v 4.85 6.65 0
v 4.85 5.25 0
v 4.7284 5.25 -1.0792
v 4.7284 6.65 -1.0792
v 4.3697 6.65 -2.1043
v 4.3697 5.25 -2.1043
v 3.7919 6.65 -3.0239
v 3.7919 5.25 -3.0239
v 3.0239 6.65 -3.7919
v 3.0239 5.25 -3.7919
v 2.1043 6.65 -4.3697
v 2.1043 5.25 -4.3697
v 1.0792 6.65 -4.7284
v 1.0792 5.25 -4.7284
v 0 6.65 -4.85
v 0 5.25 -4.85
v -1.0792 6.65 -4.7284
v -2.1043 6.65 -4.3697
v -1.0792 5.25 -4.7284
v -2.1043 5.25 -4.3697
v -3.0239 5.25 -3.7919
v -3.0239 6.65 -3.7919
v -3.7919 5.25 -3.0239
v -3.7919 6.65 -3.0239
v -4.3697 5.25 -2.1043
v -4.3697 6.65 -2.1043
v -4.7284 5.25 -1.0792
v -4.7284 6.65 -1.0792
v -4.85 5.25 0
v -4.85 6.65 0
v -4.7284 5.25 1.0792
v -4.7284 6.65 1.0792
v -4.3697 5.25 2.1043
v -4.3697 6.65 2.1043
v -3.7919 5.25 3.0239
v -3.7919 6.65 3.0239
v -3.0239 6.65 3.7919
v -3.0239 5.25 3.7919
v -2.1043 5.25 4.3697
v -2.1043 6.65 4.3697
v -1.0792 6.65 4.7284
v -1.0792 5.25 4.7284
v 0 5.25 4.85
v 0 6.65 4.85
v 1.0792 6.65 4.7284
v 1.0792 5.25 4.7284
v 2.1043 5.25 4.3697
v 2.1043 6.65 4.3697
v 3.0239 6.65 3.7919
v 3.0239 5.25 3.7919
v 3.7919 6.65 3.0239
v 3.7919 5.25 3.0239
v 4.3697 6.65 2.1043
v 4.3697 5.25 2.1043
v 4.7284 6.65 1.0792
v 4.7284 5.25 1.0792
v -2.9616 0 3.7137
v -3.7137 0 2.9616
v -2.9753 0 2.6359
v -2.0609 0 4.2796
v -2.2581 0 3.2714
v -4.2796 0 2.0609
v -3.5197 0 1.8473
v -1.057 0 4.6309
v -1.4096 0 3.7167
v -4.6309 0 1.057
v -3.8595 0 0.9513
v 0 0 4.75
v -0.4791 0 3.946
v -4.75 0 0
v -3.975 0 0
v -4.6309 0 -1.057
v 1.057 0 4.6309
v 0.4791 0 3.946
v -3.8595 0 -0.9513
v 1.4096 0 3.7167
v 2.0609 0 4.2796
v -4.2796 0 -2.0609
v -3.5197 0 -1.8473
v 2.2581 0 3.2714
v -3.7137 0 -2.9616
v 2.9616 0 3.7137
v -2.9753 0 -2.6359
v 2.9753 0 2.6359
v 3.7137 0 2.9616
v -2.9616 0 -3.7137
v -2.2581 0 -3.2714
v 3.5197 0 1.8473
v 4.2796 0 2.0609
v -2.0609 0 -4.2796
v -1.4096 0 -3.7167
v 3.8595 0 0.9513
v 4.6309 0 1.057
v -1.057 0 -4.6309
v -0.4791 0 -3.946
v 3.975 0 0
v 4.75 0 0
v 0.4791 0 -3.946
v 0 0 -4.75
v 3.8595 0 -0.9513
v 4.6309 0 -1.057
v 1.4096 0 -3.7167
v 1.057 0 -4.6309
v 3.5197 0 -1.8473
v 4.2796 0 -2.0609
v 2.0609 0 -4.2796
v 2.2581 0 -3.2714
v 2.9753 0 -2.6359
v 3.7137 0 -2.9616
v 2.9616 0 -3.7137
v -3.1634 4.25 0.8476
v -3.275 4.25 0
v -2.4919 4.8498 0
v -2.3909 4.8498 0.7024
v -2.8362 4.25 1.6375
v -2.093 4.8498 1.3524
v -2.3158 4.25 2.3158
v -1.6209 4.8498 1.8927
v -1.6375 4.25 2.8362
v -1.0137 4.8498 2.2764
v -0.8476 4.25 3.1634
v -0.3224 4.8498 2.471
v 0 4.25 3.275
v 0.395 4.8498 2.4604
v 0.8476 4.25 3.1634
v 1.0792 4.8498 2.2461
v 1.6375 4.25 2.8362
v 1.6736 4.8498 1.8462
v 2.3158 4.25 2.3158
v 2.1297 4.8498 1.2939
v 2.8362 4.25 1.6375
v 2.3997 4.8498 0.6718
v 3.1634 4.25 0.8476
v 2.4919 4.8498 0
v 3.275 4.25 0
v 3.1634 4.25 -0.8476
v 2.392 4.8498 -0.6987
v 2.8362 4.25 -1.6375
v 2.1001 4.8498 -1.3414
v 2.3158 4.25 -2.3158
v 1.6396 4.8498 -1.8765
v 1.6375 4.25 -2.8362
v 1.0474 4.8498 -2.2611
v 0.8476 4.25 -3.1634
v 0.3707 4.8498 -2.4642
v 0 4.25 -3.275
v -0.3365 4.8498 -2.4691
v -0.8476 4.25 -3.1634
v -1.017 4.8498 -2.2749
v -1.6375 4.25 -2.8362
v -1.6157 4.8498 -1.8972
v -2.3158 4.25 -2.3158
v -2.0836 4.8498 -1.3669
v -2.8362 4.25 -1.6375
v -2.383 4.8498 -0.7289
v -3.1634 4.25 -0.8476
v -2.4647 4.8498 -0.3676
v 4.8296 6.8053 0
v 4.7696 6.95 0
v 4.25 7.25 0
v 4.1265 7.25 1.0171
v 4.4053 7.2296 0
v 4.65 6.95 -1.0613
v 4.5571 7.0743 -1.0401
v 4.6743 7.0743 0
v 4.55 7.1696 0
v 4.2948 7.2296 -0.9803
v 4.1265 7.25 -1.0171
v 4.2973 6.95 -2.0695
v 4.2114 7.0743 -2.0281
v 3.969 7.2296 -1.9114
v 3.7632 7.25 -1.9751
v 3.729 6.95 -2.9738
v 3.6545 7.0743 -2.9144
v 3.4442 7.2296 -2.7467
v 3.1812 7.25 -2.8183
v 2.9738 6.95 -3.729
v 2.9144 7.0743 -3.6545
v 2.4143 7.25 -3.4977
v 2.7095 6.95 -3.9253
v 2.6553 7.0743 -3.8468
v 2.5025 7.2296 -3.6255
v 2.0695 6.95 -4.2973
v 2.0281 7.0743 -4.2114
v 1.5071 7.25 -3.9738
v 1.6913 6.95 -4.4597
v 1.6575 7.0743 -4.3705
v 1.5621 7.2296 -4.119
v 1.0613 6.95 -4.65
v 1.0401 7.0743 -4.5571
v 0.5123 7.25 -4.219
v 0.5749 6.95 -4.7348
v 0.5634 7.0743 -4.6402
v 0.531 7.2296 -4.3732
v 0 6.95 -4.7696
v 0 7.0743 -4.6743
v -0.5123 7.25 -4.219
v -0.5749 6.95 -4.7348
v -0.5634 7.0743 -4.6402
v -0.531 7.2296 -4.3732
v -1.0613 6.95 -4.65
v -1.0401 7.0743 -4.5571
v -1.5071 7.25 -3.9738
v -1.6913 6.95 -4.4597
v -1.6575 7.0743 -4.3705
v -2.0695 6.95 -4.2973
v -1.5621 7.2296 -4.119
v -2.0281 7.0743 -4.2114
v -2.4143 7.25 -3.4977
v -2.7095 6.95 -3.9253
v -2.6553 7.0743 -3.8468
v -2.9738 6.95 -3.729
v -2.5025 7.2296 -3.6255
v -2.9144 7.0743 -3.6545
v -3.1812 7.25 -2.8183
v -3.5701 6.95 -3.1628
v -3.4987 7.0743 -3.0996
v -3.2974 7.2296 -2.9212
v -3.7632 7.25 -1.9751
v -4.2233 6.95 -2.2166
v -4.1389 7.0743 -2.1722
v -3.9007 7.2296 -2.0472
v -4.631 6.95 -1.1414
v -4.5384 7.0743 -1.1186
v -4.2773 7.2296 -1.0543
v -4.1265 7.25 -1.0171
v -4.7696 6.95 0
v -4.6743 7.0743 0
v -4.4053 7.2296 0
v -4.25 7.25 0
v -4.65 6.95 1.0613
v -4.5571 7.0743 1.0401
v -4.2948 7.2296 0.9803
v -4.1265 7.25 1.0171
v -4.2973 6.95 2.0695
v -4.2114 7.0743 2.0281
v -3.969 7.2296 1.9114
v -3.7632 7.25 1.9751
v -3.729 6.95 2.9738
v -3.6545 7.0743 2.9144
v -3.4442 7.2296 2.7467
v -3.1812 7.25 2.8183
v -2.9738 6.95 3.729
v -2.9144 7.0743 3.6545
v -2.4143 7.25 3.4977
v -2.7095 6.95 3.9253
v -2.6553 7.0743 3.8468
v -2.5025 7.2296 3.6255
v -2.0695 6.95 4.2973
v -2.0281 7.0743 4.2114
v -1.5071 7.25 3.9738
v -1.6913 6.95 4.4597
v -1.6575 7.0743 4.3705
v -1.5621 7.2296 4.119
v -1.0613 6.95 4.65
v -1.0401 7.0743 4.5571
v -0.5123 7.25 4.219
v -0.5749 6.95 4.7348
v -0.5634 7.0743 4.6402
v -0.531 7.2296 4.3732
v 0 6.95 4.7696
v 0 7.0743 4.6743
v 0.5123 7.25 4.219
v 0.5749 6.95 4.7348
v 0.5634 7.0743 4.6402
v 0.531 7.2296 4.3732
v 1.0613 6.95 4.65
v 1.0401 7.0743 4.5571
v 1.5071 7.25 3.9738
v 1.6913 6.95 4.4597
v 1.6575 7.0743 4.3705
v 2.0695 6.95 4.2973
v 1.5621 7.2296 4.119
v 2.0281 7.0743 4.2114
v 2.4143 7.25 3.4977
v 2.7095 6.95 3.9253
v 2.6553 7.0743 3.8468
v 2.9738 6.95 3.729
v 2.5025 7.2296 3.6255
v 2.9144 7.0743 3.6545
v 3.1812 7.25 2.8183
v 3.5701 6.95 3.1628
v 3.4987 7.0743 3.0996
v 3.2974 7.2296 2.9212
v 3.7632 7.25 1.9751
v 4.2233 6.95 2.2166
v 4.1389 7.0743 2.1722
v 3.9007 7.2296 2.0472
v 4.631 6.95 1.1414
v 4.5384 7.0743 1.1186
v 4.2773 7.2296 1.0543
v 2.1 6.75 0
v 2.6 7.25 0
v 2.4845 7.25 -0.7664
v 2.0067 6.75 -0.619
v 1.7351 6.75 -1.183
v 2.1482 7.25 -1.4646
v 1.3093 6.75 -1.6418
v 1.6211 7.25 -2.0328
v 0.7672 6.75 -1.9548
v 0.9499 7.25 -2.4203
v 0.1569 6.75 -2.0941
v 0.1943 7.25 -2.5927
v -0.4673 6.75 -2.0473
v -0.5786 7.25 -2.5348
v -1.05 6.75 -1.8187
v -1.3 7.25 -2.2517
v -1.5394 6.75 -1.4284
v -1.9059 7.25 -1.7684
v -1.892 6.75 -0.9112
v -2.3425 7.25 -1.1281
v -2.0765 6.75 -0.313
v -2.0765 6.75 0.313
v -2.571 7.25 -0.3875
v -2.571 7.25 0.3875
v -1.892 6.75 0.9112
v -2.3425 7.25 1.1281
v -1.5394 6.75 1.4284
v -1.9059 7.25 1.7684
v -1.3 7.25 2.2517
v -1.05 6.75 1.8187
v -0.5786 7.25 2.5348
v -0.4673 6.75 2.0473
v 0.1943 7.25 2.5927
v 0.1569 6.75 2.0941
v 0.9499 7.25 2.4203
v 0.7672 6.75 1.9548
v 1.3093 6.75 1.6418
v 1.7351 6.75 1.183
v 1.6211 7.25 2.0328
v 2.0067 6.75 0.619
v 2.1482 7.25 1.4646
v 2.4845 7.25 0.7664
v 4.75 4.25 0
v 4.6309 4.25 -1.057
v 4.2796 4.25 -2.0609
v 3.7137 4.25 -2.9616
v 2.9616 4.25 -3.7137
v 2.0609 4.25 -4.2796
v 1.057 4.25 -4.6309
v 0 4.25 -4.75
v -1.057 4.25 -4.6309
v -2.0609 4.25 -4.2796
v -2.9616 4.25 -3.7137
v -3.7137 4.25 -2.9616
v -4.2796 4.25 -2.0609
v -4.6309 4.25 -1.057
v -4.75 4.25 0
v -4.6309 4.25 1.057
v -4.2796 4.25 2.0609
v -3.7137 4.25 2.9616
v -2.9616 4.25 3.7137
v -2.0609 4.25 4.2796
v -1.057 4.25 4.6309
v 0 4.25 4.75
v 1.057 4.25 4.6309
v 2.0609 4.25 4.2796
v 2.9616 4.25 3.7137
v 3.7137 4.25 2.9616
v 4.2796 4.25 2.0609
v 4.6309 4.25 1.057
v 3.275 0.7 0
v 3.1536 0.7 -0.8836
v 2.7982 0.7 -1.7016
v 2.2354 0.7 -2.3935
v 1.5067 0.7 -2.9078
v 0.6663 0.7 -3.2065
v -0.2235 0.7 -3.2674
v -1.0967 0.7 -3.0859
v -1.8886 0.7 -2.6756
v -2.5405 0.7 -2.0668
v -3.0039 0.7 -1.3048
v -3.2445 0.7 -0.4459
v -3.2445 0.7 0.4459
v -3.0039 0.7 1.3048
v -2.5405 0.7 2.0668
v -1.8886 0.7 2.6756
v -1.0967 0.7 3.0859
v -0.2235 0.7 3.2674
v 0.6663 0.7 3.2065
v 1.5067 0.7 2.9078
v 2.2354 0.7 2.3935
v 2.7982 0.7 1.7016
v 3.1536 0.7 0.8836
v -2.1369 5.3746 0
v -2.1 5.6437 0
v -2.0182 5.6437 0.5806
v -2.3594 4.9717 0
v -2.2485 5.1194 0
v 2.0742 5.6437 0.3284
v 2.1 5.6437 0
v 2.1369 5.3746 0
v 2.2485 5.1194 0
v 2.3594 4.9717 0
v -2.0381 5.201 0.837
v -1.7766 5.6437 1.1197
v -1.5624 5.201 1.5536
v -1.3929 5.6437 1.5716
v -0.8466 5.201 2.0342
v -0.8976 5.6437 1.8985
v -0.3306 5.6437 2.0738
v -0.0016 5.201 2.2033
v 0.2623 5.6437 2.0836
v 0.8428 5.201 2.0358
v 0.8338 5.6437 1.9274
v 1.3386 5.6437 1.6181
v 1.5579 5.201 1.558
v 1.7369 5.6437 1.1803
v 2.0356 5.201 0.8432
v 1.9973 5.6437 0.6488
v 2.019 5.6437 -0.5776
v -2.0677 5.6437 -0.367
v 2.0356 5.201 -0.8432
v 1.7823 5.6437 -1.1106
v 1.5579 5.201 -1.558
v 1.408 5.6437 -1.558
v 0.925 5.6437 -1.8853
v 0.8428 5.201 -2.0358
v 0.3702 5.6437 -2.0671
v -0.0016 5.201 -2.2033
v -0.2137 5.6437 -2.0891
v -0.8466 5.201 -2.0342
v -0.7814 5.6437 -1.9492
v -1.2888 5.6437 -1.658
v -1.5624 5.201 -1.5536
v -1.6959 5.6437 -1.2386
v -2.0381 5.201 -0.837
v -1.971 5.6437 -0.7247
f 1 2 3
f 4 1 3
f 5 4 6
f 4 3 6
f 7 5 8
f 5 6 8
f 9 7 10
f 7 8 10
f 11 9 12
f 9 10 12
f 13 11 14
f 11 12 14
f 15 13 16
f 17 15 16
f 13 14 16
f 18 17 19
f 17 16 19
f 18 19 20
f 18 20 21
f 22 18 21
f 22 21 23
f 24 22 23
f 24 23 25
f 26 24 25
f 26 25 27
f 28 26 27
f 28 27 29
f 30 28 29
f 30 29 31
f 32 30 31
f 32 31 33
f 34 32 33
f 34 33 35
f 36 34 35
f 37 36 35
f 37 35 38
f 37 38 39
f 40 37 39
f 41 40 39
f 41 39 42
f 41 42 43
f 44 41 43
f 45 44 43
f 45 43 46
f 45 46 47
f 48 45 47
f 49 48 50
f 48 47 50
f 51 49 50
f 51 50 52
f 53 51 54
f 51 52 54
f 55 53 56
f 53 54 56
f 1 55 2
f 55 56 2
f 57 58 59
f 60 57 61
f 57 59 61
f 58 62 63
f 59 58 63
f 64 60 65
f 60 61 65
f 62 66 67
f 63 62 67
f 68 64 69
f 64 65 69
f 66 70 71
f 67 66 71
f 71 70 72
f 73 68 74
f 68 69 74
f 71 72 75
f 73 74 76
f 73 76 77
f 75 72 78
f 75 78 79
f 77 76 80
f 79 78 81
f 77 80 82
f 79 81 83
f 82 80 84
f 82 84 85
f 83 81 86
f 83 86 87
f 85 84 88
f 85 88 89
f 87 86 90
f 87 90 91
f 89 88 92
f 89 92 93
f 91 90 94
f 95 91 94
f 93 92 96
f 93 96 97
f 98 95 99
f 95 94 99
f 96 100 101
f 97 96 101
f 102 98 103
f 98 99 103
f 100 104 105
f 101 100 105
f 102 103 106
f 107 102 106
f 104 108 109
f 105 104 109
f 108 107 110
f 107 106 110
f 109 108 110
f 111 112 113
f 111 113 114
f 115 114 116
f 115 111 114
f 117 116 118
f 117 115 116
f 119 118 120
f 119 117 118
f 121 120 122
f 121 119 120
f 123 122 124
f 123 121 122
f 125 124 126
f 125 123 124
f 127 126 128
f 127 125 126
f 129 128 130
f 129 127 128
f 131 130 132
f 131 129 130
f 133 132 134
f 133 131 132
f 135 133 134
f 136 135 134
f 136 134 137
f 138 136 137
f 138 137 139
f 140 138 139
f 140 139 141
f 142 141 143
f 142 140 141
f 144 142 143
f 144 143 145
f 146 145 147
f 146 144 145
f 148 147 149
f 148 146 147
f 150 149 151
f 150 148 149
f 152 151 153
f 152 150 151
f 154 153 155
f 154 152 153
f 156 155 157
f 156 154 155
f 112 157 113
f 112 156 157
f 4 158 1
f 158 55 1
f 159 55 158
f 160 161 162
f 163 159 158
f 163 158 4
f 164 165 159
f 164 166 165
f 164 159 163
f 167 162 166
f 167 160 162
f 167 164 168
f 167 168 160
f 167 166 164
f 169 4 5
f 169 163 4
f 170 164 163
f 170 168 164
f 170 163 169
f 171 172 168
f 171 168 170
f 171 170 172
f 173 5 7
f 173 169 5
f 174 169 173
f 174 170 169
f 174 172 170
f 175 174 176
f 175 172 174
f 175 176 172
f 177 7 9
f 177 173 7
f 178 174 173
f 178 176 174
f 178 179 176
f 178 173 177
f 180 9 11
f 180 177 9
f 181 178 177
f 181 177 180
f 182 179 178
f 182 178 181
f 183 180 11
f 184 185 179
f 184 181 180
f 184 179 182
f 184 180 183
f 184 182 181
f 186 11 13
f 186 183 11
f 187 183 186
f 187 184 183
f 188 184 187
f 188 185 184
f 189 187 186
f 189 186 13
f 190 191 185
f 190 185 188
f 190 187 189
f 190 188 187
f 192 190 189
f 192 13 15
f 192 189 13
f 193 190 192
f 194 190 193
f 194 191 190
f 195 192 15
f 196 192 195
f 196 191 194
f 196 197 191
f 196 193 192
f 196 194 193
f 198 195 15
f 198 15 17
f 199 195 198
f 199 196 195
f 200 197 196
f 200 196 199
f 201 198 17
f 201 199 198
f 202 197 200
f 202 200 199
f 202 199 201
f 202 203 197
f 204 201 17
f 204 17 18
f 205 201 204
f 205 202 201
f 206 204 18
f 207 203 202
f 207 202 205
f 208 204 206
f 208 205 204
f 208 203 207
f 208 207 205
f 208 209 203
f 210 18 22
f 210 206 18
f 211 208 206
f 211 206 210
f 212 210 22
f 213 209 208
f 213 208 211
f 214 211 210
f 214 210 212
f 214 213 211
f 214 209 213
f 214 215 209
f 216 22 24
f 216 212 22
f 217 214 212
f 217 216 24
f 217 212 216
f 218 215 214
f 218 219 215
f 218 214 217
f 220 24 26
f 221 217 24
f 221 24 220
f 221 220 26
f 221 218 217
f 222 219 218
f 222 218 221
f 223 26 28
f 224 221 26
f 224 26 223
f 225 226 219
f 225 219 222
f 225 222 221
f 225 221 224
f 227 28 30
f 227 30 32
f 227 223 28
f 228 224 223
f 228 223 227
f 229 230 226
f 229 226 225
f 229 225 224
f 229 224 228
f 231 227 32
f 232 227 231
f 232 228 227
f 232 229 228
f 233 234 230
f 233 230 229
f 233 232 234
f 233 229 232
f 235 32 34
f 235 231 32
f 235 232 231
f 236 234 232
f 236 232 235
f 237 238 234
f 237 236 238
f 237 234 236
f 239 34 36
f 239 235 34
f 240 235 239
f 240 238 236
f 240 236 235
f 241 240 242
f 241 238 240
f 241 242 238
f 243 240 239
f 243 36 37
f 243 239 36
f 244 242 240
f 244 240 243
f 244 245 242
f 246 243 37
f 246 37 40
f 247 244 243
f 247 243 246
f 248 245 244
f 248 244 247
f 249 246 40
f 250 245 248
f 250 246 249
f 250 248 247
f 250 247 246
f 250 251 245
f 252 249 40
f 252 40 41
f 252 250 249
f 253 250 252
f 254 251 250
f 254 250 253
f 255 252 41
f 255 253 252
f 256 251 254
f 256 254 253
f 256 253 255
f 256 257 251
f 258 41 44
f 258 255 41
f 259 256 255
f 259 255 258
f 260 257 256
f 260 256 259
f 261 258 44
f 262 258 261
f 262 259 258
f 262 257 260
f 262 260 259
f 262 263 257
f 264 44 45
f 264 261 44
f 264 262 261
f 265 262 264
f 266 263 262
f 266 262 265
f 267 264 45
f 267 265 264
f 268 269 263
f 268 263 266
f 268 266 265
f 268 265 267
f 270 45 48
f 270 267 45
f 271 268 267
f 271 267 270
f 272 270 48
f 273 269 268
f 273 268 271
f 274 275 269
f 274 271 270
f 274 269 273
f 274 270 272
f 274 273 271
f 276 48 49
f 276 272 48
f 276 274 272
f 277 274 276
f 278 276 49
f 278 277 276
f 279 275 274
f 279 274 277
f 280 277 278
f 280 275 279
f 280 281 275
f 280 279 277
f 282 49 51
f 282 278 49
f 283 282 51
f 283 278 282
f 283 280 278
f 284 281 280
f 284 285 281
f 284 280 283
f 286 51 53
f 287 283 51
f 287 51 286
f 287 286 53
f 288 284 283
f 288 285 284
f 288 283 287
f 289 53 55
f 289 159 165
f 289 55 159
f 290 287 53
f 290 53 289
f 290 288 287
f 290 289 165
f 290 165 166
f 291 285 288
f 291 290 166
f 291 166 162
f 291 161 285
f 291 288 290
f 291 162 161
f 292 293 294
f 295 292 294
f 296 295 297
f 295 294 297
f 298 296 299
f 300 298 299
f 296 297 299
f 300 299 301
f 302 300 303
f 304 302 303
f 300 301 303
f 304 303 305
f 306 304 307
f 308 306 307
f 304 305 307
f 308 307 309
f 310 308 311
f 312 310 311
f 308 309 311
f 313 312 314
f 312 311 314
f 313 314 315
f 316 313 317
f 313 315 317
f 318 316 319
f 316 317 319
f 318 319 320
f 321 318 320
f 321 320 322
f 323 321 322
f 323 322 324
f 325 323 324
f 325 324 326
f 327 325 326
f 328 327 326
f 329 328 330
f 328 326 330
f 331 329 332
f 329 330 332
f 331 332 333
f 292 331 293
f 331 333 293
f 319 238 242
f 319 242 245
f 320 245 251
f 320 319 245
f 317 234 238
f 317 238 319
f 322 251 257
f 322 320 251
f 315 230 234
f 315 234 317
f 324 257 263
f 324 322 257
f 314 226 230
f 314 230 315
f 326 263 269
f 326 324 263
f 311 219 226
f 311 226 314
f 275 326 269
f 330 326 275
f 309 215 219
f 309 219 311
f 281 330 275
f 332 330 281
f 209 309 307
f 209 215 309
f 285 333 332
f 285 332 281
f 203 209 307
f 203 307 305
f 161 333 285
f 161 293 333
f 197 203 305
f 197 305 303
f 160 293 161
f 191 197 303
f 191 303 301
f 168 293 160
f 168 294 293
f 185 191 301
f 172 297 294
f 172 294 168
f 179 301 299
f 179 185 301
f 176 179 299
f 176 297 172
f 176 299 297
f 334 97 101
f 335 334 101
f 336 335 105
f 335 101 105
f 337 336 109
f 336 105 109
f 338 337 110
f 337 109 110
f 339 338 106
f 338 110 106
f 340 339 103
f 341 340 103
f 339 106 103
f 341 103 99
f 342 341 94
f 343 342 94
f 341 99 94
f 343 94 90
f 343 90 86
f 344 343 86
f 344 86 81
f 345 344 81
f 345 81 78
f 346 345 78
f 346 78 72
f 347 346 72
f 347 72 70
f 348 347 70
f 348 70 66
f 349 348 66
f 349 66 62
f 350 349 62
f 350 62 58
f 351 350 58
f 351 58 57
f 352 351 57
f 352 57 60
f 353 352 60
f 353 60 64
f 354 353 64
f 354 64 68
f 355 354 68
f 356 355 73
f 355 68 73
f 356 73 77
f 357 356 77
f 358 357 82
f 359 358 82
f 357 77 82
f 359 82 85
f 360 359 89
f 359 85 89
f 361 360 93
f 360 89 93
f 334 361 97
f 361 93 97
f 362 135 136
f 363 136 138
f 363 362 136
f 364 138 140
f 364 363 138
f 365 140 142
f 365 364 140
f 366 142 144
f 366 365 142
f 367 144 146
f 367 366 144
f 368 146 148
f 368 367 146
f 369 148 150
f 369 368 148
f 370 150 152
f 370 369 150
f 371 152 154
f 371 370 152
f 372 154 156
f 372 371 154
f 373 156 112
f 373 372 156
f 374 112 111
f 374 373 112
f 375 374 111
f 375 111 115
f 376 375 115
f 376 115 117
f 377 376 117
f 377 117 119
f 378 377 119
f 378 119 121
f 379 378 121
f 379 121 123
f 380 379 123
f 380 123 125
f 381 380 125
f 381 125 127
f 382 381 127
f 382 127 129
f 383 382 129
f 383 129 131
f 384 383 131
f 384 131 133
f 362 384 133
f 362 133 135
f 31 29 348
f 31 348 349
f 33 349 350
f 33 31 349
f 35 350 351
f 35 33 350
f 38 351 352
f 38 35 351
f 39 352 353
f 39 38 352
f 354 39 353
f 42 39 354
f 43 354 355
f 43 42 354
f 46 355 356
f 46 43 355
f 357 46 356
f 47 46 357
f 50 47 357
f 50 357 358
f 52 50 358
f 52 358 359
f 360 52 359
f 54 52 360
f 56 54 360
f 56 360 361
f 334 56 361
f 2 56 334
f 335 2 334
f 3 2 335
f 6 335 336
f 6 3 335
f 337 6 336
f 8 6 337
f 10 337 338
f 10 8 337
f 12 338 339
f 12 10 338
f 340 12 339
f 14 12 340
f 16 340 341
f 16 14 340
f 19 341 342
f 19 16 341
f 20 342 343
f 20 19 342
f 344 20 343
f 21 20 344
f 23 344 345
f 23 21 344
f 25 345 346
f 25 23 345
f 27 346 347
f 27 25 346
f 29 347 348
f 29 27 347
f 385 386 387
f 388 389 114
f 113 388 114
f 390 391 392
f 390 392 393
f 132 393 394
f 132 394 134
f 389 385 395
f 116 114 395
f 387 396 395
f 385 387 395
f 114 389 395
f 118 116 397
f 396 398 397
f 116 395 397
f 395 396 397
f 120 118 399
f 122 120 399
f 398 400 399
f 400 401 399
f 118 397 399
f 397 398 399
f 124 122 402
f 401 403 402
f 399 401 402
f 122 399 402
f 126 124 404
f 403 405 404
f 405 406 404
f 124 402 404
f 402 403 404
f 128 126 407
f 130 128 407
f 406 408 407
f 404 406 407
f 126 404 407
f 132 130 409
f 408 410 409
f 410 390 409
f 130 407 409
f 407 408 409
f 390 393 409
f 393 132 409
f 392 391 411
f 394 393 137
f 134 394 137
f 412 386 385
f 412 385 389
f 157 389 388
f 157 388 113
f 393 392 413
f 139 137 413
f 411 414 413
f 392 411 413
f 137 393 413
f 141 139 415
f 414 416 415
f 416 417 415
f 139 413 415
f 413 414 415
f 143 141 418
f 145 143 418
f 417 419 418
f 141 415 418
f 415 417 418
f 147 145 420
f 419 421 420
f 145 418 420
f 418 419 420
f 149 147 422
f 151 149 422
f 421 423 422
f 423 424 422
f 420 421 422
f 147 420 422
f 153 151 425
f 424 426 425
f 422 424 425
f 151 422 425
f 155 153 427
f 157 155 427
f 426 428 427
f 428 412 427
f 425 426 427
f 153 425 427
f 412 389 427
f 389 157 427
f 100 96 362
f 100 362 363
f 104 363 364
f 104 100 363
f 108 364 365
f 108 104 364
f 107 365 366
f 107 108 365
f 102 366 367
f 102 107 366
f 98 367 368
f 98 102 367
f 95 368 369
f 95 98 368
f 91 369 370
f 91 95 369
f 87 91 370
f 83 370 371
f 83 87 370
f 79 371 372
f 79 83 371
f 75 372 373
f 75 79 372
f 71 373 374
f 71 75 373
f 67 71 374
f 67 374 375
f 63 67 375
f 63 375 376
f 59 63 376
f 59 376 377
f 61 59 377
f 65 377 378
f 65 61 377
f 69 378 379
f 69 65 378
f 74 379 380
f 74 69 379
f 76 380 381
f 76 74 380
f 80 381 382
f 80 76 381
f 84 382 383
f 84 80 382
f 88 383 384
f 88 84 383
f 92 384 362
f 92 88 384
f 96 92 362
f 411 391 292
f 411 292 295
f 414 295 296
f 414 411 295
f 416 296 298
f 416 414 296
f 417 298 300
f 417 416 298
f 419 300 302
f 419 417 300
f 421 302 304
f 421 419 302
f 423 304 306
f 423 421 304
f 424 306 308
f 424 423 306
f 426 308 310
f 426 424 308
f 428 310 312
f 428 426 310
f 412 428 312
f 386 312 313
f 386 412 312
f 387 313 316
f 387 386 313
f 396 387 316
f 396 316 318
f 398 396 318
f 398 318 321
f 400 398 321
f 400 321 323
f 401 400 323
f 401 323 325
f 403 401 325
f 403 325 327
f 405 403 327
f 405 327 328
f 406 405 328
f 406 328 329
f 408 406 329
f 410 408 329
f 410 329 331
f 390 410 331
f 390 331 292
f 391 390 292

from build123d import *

# Parameters (mm, degrees)
CROQUIS1_R              = 4.75
CROQUIS1_R_2            = 3.275
SALIENTE_EXTRUIR1_DEPTH = 4.25
CROQUIS3_R              = 4.85
CROQUIS3_R_2            = 2.1
SALIENTE_EXTRUIR2_DEPTH = 2
REDONDEO1_R             = 0.6
REDONDEO2_R             = 1
CHAFL_N1_SIZE           = 0.7
CHAFL_N2_SIZE           = 0.5


with BuildPart() as part:
    # Croquis1 → Saliente-Extruir1 (new body)
    with BuildSketch(Plane(origin=(0, 0, 0), x_dir=(1, 0, 0), z_dir=(0, 1, 0))):
        Circle(CROQUIS1_R)
        Circle(CROQUIS1_R_2, mode=Mode.SUBTRACT)
    extrude(amount=SALIENTE_EXTRUIR1_DEPTH)

    # Croquis2 → Revolución1 (revolve)
    with BuildSketch(Plane.XY):
        Polygon((-4.75, 4.25), (-4.85, 5.25), (-2.1, 5.25), (-2.1, 5.15), (-3.275, 4.25), align=None)
    revolve(axis=Axis((0, 0, 0), (0, 1, 0)))

    # Croquis3 → Saliente-Extruir2 (add)
    with BuildSketch(Plane(origin=(0, 5.25, 0), x_dir=(1, 0, 0), z_dir=(0, 1, 0))):
        Circle(CROQUIS3_R)
        Circle(CROQUIS3_R_2, mode=Mode.SUBTRACT)
    extrude(amount=SALIENTE_EXTRUIR2_DEPTH)

    # Redondeo1
    redondeo1_edges = [part.edges().sort_by_distance(p)[0] for p in [
        (-4.85, 7.25, 0),
    ]]
    fillet(redondeo1_edges, radius=REDONDEO1_R)

    # Redondeo2
    redondeo2_edges = [part.edges().sort_by_distance(p)[0] for p in [
        (2.1, 5.15, 0),
    ]]
    fillet(redondeo2_edges, radius=REDONDEO2_R)

    # Chaflán1
    chafl_n1_edges = [part.edges().sort_by_distance(p)[0] for p in [
        (-3.275, 0, 0),
    ]]
    chamfer(chafl_n1_edges, length=CHAFL_N1_SIZE)

    # Chaflán2
    chafl_n2_edges = [part.edges().sort_by_distance(p)[0] for p in [
        (-2.1, 7.25, 0),
    ]]
    chamfer(chafl_n2_edges, length=CHAFL_N2_SIZE)


solid = part.part
